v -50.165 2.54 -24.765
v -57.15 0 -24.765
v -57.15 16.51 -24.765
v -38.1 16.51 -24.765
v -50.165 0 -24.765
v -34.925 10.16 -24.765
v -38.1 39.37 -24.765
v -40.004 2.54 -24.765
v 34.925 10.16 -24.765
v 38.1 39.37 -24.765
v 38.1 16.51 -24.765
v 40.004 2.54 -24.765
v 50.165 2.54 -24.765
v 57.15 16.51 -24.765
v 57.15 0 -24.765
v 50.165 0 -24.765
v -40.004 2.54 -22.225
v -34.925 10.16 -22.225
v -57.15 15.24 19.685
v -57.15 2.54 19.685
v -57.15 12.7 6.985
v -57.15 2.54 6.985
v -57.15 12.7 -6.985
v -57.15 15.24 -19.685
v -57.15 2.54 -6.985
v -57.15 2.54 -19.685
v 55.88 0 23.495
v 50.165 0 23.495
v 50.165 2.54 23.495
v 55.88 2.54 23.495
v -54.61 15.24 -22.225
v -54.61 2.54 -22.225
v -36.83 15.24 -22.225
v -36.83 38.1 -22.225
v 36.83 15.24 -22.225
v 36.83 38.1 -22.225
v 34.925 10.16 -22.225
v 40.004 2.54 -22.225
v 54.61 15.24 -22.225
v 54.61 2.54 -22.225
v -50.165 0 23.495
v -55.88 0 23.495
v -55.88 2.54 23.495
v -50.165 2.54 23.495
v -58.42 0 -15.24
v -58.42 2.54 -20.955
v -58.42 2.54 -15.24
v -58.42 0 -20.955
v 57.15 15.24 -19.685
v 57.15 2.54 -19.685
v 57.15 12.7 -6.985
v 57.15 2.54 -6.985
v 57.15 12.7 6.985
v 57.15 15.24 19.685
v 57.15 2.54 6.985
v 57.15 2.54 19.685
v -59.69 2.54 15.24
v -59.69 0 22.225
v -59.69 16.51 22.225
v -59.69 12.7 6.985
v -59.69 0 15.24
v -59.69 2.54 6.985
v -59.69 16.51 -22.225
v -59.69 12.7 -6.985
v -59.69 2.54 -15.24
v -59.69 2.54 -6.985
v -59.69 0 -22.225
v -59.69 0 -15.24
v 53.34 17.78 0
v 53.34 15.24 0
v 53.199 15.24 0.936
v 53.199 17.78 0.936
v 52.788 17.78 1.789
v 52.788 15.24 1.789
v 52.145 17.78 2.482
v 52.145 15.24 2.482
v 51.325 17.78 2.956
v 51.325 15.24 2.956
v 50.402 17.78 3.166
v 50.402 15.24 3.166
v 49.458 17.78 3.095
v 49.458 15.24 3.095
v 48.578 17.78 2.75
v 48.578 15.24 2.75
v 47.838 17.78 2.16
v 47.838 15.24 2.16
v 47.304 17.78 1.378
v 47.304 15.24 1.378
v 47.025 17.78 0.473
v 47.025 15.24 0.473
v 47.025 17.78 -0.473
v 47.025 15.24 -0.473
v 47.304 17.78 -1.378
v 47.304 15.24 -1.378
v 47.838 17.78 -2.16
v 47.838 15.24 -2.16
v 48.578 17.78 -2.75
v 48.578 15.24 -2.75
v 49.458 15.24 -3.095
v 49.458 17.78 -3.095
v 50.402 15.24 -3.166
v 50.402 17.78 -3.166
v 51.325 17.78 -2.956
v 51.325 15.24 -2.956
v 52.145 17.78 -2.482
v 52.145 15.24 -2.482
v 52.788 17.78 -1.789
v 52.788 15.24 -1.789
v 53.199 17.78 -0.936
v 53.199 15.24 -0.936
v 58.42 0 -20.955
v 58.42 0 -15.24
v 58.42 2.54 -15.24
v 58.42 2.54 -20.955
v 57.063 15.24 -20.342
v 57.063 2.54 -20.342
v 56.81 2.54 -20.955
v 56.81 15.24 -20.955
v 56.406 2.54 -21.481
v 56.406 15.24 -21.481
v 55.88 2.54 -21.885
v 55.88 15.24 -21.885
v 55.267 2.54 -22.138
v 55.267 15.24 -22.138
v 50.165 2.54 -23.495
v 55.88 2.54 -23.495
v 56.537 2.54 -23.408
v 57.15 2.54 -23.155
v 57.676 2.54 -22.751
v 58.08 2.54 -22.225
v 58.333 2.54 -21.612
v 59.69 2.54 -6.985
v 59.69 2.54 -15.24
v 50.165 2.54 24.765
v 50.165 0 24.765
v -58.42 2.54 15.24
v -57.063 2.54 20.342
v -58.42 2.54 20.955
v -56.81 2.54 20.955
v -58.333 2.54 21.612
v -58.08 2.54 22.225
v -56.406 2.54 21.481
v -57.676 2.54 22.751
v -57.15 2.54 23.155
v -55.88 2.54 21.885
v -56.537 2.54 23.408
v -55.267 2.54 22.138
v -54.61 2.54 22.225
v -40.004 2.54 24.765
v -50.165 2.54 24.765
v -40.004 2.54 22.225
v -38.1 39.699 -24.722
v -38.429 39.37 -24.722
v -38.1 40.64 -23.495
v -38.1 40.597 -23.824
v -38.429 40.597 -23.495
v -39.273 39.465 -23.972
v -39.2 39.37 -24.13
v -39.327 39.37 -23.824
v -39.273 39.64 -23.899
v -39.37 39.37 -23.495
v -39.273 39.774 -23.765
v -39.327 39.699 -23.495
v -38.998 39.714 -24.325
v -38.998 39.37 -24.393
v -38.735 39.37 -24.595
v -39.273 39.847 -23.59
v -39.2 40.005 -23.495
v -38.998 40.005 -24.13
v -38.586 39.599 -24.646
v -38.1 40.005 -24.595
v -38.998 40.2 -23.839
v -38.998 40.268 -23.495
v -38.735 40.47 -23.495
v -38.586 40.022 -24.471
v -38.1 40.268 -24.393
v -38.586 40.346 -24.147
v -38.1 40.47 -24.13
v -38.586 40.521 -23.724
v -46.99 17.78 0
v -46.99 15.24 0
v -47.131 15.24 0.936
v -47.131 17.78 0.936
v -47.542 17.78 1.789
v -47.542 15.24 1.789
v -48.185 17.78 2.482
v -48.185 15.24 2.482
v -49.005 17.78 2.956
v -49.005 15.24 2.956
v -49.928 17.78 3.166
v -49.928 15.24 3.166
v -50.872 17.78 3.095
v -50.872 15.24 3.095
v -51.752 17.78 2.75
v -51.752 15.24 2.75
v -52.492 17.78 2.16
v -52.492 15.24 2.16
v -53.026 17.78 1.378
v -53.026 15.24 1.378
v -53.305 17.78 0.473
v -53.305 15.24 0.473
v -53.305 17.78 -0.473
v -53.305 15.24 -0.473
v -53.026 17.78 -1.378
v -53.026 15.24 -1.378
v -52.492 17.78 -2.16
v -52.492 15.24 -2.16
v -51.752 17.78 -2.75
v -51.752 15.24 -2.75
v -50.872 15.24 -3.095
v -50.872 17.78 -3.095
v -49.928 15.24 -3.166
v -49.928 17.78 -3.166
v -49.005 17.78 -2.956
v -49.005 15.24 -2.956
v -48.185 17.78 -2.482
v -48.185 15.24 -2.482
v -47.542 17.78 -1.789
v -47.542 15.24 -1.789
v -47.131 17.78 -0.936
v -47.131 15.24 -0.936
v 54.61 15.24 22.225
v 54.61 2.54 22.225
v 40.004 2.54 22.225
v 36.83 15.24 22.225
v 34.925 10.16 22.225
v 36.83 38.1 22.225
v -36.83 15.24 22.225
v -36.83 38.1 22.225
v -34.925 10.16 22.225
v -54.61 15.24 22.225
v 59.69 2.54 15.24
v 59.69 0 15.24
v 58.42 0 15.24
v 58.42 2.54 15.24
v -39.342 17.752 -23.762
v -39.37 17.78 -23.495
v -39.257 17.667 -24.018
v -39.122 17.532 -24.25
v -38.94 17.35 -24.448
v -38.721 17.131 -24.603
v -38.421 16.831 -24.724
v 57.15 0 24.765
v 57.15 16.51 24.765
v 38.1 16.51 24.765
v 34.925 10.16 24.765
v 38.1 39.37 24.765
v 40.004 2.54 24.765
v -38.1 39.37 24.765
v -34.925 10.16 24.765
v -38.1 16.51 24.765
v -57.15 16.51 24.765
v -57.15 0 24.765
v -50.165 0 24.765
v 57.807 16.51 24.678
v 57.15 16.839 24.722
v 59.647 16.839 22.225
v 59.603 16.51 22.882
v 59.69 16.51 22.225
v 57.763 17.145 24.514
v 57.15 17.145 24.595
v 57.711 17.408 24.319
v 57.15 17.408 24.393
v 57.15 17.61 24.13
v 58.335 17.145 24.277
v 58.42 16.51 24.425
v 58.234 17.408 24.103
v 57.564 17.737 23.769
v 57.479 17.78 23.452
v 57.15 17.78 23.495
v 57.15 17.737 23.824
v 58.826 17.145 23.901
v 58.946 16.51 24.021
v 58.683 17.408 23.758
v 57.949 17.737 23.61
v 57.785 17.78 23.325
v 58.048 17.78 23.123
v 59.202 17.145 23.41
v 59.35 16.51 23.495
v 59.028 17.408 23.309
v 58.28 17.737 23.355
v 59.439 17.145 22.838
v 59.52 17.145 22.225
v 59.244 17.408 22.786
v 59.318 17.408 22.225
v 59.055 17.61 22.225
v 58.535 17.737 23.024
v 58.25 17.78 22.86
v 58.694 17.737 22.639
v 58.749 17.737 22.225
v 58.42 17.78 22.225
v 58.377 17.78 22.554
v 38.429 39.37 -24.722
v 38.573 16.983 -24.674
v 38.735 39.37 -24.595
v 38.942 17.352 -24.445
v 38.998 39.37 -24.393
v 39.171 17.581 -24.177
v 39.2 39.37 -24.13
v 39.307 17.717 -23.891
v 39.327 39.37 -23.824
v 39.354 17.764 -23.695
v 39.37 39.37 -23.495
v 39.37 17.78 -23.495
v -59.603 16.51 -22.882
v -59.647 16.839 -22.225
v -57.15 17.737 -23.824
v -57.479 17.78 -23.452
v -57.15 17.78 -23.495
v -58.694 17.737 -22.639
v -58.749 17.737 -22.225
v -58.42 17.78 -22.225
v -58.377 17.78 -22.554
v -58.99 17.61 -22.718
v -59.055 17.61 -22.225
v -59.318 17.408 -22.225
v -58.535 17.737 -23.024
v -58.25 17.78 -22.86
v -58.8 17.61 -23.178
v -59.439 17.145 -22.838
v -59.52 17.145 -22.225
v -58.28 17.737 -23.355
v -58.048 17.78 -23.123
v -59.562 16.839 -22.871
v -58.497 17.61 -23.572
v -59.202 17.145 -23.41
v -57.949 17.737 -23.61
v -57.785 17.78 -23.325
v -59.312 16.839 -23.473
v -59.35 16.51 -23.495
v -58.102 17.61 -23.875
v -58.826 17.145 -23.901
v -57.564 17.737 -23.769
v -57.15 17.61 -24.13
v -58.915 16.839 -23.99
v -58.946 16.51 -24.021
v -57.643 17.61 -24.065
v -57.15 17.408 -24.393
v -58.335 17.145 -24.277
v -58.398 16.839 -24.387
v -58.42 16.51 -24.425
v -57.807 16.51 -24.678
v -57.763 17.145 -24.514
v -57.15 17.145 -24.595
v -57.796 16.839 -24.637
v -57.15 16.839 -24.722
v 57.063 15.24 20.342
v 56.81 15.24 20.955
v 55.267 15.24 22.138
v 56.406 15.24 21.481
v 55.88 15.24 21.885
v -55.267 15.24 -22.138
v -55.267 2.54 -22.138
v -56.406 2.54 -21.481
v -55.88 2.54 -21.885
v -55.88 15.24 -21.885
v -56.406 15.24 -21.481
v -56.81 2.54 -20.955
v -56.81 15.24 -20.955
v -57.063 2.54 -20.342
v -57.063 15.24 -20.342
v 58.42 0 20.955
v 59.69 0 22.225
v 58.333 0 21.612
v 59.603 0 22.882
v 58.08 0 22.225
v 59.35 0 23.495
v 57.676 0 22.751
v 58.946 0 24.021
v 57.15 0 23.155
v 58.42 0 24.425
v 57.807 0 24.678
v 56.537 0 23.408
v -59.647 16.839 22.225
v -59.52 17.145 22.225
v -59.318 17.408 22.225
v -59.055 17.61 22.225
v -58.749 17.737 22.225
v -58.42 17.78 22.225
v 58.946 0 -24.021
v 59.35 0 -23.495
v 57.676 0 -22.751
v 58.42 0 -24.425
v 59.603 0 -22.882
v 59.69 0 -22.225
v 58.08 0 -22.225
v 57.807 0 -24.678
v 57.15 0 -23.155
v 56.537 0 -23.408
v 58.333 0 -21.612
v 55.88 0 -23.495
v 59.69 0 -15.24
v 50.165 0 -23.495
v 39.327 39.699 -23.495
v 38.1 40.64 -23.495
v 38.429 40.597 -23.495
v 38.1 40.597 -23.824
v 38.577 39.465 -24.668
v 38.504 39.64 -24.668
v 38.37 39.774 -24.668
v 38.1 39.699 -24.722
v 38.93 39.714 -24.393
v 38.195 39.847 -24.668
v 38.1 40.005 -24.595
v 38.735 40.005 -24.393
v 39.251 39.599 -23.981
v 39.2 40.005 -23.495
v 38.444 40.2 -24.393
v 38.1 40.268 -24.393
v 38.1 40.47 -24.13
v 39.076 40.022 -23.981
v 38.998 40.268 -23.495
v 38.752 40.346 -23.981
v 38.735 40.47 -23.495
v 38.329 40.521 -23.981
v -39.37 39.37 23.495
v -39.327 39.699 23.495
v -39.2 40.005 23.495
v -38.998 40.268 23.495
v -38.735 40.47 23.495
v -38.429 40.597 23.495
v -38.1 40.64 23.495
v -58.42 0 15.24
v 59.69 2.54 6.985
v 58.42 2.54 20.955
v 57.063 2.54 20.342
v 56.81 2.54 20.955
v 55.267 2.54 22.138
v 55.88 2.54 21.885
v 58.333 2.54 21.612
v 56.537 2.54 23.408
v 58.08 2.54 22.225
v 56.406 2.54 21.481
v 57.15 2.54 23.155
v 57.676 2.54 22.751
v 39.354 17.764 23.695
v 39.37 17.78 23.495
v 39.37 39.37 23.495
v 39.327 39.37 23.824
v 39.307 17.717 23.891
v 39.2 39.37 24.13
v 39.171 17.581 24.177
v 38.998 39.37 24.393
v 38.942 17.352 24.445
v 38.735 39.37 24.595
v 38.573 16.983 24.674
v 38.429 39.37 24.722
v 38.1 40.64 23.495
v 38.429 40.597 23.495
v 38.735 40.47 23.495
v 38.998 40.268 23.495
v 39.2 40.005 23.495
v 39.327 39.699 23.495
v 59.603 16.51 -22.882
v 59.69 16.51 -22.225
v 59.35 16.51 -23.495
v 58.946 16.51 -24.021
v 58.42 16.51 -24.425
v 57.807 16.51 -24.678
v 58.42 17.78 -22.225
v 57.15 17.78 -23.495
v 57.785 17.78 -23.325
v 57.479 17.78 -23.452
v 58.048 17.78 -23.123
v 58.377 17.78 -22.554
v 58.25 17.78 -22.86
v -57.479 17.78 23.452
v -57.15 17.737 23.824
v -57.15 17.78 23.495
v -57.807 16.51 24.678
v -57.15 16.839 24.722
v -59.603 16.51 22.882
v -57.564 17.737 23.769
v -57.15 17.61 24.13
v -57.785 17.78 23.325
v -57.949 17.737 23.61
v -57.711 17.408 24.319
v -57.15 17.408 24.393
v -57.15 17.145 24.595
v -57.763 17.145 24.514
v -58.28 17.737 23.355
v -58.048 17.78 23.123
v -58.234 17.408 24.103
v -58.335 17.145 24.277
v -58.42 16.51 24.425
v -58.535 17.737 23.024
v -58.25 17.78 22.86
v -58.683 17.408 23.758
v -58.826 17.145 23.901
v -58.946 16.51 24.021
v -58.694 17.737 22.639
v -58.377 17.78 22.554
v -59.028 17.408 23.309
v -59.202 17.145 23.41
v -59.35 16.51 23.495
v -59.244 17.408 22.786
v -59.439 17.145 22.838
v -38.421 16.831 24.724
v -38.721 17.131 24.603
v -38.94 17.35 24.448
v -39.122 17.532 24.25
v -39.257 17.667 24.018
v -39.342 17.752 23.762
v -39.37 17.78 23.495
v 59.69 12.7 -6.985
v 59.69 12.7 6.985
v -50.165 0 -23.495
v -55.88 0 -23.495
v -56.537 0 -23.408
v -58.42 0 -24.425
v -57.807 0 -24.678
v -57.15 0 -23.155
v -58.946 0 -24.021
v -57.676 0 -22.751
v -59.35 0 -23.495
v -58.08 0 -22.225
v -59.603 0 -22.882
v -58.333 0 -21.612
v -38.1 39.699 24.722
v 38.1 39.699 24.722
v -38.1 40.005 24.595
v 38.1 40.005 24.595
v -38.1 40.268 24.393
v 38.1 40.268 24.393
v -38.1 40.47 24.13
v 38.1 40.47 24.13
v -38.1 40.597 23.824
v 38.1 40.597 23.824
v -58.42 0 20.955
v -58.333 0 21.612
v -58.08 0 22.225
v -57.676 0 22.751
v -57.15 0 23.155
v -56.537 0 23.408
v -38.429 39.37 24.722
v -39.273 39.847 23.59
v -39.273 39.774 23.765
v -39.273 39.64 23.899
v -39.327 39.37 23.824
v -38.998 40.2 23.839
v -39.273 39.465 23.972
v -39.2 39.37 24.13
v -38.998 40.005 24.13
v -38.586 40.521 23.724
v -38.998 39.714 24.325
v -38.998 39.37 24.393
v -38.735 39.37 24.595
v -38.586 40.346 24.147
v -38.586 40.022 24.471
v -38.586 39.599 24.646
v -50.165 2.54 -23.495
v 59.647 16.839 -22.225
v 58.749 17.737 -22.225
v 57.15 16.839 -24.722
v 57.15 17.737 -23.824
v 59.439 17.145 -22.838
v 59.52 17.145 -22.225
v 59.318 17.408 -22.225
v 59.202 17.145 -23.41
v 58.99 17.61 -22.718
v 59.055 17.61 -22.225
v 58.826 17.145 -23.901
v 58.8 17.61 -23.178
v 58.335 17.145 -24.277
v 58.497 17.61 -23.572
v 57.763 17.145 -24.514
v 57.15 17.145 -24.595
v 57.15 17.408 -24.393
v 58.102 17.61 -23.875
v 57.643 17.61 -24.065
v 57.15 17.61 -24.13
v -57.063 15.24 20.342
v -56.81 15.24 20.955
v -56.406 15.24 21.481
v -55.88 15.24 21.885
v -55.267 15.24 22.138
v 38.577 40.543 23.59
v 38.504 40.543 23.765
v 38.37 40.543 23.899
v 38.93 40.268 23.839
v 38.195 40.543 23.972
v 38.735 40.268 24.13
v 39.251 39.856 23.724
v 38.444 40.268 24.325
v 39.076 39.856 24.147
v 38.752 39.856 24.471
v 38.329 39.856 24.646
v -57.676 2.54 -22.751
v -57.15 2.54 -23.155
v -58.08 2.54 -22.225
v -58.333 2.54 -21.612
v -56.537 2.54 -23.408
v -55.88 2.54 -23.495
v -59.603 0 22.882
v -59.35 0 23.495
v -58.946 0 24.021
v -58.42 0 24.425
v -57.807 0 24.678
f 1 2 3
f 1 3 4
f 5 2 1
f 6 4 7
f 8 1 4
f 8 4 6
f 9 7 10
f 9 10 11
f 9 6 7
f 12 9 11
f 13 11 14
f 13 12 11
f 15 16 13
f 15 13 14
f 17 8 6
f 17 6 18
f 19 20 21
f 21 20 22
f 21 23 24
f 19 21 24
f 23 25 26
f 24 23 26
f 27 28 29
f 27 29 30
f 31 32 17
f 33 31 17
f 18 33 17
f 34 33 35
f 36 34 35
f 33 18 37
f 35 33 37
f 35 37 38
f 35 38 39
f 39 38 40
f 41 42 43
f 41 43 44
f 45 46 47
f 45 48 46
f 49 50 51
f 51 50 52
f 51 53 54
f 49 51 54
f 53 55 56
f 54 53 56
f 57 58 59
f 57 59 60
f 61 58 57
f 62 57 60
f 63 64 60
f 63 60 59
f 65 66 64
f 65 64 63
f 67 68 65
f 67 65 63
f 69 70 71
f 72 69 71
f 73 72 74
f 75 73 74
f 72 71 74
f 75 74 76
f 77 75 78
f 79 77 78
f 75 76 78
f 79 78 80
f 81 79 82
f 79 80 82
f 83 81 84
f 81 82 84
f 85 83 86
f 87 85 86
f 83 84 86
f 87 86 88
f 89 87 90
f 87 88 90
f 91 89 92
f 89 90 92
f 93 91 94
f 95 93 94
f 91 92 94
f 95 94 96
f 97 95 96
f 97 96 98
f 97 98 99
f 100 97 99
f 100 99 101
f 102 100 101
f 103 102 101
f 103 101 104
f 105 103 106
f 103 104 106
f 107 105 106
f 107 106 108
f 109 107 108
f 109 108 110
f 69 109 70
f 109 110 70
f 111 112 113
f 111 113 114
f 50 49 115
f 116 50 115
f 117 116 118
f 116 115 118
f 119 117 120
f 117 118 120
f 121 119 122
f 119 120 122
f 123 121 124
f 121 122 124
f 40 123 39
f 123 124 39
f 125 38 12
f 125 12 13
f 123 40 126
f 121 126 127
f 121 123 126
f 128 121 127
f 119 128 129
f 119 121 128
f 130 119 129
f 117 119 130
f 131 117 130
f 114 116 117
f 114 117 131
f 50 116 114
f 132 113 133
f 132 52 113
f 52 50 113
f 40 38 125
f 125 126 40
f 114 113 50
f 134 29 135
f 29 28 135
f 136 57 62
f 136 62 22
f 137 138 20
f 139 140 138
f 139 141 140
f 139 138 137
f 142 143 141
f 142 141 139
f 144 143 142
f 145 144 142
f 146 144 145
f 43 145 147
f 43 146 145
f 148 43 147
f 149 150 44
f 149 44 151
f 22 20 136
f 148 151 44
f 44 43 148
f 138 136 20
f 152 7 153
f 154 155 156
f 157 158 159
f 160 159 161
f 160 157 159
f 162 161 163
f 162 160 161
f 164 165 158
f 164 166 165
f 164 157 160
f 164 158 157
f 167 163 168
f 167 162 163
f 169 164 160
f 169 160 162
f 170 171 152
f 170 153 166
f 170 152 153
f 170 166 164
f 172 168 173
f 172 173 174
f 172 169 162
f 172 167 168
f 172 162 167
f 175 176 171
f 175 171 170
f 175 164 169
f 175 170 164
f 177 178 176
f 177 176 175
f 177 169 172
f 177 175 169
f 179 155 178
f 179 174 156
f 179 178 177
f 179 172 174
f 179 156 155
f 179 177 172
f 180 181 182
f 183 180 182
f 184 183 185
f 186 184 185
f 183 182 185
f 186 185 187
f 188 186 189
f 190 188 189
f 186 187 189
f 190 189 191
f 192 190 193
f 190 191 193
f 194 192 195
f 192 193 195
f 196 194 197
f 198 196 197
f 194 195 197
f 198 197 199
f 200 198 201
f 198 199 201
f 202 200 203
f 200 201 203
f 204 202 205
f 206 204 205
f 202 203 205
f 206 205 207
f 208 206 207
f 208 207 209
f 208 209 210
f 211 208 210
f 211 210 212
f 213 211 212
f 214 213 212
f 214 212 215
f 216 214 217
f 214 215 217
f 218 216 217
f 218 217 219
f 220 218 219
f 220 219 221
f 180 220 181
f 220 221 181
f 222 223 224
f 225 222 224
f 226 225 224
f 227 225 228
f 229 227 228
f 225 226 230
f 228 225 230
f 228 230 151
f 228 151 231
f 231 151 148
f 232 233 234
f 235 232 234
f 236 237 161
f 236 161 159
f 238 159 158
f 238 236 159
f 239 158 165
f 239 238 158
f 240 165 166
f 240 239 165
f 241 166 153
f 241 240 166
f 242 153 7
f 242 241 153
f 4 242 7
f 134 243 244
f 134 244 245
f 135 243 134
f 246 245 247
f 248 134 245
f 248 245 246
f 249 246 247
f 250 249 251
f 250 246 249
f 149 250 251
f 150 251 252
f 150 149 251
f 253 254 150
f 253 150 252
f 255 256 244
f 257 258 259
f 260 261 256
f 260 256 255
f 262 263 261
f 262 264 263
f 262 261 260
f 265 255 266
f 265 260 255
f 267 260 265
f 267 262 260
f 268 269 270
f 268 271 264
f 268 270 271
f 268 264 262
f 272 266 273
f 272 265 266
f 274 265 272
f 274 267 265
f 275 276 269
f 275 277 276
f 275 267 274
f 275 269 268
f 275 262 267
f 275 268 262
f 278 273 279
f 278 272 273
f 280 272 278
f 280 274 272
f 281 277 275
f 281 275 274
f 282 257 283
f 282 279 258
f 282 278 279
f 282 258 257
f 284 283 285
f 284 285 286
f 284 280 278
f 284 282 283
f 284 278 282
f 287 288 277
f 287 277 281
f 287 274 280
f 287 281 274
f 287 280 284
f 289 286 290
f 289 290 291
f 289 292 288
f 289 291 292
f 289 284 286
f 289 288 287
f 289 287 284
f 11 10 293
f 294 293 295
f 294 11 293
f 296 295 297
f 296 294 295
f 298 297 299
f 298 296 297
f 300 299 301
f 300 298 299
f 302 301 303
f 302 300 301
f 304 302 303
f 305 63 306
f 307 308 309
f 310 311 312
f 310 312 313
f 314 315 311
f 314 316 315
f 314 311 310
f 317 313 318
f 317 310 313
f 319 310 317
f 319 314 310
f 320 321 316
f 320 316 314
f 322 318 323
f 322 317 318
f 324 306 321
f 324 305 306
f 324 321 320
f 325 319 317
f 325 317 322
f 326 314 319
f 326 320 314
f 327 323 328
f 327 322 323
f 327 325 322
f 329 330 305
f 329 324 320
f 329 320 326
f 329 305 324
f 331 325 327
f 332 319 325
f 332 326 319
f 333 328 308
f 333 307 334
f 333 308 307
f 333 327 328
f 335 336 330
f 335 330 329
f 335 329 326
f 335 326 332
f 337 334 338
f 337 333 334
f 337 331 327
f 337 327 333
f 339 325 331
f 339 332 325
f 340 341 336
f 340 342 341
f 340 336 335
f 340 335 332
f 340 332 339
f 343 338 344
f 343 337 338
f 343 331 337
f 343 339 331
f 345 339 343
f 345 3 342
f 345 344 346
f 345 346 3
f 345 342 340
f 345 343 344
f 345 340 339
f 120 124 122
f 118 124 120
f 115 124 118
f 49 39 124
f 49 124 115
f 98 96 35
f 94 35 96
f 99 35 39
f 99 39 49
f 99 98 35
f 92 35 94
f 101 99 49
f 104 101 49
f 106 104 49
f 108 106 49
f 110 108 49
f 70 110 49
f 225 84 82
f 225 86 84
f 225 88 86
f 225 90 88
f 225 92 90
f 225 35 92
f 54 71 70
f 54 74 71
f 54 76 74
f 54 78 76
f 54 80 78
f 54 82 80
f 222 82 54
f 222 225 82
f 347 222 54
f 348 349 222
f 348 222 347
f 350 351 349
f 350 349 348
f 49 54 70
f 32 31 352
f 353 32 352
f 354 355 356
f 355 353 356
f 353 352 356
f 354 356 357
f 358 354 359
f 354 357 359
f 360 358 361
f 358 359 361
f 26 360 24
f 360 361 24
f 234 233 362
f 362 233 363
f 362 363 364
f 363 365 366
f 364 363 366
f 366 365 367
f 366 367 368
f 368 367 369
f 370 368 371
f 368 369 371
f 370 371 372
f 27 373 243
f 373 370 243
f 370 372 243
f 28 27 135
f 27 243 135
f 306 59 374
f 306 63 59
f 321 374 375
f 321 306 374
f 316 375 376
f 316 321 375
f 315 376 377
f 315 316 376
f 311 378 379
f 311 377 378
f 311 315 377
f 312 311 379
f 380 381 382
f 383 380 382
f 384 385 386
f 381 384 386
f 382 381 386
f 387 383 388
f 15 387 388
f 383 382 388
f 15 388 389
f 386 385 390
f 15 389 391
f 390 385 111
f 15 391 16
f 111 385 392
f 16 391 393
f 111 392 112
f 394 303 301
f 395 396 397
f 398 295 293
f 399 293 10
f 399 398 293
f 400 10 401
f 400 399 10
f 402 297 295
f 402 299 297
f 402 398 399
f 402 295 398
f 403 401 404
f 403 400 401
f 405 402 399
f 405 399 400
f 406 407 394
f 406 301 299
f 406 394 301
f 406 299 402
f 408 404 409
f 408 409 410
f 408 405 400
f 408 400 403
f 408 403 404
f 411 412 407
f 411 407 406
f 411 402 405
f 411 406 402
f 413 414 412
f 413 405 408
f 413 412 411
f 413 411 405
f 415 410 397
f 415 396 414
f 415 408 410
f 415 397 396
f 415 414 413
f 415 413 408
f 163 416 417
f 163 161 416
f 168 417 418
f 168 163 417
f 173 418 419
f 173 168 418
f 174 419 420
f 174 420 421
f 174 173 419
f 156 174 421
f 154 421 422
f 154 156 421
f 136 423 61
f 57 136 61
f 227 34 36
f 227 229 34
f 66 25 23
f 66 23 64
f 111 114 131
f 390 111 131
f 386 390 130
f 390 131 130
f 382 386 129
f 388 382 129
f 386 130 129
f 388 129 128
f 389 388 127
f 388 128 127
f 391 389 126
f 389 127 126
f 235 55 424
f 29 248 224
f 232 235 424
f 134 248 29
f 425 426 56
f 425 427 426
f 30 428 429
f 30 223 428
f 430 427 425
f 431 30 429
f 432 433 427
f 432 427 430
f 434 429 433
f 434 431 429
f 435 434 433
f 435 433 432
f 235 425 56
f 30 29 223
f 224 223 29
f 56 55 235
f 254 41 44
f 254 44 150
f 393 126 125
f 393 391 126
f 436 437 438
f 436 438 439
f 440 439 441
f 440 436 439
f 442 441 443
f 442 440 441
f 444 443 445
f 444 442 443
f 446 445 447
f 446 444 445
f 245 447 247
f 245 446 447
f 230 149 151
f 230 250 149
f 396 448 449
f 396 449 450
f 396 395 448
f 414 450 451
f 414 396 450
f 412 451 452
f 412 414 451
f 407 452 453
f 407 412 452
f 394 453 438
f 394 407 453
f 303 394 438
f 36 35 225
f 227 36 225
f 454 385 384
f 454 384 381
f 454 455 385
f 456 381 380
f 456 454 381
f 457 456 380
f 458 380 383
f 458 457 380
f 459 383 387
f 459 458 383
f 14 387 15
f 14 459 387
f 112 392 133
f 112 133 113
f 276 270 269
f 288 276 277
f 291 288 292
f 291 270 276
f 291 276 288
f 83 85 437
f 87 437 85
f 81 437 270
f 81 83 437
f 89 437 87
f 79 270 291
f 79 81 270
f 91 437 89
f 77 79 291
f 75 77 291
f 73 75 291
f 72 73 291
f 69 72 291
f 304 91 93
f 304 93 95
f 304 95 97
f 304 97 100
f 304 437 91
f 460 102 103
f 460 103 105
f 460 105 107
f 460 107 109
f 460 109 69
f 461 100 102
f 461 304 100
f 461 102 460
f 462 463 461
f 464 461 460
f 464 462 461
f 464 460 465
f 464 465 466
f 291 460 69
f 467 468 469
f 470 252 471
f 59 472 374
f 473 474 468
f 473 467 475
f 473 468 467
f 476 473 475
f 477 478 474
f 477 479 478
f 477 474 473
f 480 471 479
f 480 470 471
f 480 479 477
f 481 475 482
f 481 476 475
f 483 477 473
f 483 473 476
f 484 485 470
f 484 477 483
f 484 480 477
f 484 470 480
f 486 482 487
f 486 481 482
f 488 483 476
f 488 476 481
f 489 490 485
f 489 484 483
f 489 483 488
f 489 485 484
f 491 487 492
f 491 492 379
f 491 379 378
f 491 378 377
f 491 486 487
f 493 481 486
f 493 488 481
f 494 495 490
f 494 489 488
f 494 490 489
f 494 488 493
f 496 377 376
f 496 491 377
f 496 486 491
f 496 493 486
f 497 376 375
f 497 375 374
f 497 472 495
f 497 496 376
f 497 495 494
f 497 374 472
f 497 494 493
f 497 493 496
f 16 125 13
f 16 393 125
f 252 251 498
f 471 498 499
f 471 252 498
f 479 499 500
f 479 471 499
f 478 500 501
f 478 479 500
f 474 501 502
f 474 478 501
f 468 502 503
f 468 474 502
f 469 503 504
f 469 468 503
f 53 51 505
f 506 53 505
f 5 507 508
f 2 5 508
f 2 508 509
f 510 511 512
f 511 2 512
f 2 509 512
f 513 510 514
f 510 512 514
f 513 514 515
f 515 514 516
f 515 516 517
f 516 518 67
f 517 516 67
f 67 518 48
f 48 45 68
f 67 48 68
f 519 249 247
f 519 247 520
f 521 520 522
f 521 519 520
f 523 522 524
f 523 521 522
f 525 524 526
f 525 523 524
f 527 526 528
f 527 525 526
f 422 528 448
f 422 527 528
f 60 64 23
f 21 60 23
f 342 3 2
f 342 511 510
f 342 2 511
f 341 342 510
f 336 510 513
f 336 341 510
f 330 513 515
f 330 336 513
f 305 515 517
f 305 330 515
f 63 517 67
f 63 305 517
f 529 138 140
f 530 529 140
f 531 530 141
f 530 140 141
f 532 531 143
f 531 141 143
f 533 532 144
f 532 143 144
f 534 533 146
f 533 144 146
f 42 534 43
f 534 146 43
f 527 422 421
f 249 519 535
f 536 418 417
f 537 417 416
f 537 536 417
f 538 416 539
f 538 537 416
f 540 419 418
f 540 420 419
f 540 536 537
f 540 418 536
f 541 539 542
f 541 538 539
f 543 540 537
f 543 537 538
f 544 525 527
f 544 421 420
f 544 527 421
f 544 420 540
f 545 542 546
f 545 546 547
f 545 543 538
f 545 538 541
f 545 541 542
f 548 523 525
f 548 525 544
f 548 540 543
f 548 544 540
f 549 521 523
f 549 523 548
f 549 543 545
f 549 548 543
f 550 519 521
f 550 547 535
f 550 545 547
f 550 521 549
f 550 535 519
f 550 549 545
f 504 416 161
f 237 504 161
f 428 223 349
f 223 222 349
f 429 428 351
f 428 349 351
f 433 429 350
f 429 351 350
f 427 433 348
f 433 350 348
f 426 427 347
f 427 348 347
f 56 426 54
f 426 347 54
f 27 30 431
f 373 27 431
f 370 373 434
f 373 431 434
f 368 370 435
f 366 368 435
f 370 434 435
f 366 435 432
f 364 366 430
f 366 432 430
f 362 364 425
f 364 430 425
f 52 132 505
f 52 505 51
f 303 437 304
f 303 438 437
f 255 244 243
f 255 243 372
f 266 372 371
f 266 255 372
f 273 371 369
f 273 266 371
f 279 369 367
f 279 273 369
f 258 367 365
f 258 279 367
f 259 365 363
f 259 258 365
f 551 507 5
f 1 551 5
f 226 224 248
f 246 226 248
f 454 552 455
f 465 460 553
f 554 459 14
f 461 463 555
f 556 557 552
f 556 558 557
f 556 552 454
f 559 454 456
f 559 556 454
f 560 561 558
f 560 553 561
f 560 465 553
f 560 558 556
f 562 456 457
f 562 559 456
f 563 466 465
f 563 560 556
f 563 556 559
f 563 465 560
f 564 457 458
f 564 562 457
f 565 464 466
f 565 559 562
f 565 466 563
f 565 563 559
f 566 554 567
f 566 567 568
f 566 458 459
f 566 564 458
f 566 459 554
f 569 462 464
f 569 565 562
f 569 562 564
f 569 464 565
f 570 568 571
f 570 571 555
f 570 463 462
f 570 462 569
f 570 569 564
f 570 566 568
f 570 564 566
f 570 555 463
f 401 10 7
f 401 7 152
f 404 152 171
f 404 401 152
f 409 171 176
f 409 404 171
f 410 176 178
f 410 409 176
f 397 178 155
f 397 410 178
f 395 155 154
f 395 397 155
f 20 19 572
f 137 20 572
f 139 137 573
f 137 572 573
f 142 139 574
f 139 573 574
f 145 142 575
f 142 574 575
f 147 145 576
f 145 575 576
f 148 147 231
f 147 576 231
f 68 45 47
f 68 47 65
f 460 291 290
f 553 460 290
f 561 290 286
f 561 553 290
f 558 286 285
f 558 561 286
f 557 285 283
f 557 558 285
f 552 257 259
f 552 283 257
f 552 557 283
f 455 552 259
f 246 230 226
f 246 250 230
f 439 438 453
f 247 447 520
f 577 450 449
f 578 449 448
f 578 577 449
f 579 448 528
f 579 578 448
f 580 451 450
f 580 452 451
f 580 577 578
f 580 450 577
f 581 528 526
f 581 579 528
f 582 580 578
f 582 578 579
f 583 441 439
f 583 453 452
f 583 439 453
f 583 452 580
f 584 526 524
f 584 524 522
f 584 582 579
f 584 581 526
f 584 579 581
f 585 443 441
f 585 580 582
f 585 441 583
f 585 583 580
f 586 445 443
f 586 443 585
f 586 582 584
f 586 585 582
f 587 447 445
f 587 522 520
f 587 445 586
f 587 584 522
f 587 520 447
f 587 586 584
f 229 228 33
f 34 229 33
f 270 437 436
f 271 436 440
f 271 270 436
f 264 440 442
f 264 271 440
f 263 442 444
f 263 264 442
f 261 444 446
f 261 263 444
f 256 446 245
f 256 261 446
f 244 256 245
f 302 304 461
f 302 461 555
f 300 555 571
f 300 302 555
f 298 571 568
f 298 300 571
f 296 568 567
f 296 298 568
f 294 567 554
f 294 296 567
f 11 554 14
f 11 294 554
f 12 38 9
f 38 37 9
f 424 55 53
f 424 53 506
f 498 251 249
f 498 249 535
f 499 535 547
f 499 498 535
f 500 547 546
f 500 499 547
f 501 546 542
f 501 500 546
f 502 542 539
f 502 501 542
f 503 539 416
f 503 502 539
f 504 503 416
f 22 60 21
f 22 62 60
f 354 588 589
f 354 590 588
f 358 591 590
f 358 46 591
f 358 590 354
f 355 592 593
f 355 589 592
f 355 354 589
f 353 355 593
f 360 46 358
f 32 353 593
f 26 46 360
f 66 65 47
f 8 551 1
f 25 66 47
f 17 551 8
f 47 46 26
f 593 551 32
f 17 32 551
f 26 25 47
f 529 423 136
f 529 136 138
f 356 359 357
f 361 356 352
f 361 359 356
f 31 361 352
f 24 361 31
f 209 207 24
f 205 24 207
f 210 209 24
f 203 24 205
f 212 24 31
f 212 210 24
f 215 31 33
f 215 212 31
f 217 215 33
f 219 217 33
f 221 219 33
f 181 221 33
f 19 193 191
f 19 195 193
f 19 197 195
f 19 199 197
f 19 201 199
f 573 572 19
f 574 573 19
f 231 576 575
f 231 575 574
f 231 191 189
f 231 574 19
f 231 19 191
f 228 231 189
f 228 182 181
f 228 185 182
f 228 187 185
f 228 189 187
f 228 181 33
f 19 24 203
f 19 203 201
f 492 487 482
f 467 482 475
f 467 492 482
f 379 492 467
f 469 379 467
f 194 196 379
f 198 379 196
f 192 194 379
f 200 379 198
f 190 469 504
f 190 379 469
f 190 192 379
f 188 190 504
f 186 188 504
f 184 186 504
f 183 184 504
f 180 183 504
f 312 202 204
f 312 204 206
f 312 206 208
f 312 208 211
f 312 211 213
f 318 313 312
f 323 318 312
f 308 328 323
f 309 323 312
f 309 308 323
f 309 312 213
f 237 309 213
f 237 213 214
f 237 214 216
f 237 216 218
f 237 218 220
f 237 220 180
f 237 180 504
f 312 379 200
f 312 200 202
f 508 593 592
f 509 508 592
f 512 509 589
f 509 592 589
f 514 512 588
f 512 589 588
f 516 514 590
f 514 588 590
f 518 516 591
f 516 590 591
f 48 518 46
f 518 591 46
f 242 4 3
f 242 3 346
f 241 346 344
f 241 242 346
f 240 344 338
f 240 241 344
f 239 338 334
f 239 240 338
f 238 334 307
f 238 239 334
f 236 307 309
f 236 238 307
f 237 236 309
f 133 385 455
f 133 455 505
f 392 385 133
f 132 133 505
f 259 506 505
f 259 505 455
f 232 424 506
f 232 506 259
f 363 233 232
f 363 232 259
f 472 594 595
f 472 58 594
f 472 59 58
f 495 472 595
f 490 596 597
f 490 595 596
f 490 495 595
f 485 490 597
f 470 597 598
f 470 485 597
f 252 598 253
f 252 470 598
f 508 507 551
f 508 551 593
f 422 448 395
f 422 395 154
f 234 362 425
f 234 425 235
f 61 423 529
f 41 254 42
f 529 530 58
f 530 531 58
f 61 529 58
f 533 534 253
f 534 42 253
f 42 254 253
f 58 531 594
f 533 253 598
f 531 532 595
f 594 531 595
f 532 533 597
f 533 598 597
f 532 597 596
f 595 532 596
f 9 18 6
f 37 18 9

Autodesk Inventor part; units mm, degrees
ref_plane "YZ Plane" through (0, 0, 0) normal (1, 0, 0) x (0, 1, 0)
ref_plane "XZ Plane" through (0, 0, 0) normal (0, 1, 0) x (-1, 0, 0)
ref_plane "XY Plane" through (0, 0, 0) normal (0, 0, 1) x (1, 0, 0)
sketch "Sketch1" plane through (0, 0, 0) normal (0, 1, 0) x (-1, 0, 0)
  line L0 (-59.69, 24.765) -> (59.69, 24.765)
  line L1 (59.69, 24.765) -> (59.69, -24.765)
  line L2 (59.69, -24.765) -> (-59.69, -24.765)
  line L3 (-59.69, -24.765) -> (-59.69, 24.765)
  point P0 (0, 0)
  dimension "d0" = 119.38
  dimension "d1" = 49.53
  dimension "d2" = 24.765
  dimension "d22" = 59.69
extrude "Extrusion1" add sketch "Sketch1" along normal blind 40.64
sketch "Sketch2" plane through (0, 40.64, 0) normal (0, 1, 0) x (1, 0, 0)
  line L0 (-59.69, -24.765) -> (-39.37, -24.765)
  line L1 (-39.37, -24.765) -> (-39.37, 24.765)
  line L2 (-39.37, 24.765) -> (-59.69, 24.765)
  line L3 (-59.69, 24.765) -> (-59.69, -24.765)
  line L4 (59.69, -24.765) -> (59.69, 24.765) projected
  line L5 (59.69, -24.765) -> (39.37, -24.765)
  line L6 (39.37, -24.765) -> (39.37, 24.765)
  line L7 (39.37, 24.765) -> (59.69, 24.765)
  line L8 (59.69, 24.765) -> (59.69, -24.765)
  point P0 (0, 0)
  point P1 (59.69, 24.765)
  dimension "d6" = 20.32
  dimension "d7" = 20.32
  dimension "d8" = 49.53
  dimension "d9" = 49.53
  dimension "d10" = 78.74
extrude "Extrusion2" cut sketch "Sketch2" against normal blind 22.86
sketch "Sketch3" plane through (0, 0, 0) normal (0, -1, 0) x (1, 0, 0)
  circle A0 centre (50.165, 0) radius 3.175
  circle A1 centre (-50.165, 0) radius 3.175
  line L0 (-59.69, -24.765) -> (-59.69, 24.765) projected
  line L1 (59.69, 24.765) -> (59.69, -24.765) projected
  point P0 (0, 0)
  dimension "d13" = 6.35
  dimension "d14" = 6.35
  dimension "d15" = 6.35
extrude "Extrusion3" cut sketch "Sketch3" against normal blind 22.86
sketch "Sketch4" plane through (0, 0, 0) normal (0, -1, 0) x (1, 0, 0)
  line L0 (-57.15, -22.225) -> (57.15, -22.225)
  line L1 (57.15, -22.225) -> (57.15, 22.225)
  line L2 (57.15, 22.225) -> (-57.15, 22.225)
  line L3 (-57.15, 22.225) -> (-57.15, -22.225)
  line L4 (-59.69, -24.765) -> (-59.69, 24.765) projected
  line L5 (59.69, 24.765) -> (59.69, -24.765) projected
  line L6 (-59.69, 24.765) -> (59.69, 24.765) projected
  line L7 (59.69, -24.765) -> (-59.69, -24.765) projected
  point P0 (0, 0)
  dimension "d18" = 2.54
  dimension "d19" = 2.54
  dimension "d20" = 2.54
  dimension "d21" = 2.54
extrude "Extrusion4" cut sketch "Sketch4" against normal blind 15.24 contours L3 L2 L1 L0
sketch "Sketch5" plane through (0, 15.24, 0) normal (0, -1, 0) x (1, 0, 0)
  line L0 (-57.15, 22.225) -> (57.15, 22.225) projected
  line L1 (-36.83, -22.225) -> (36.83, -22.225)
  line L2 (36.83, -22.225) -> (36.83, 22.225)
  line L3 (36.83, 22.225) -> (-36.83, 22.225)
  line L4 (-36.83, 22.225) -> (-36.83, -22.225)
  line L5 (-36.83, -22.225) -> (36.83, 22.225) construction
  line L6 (36.83, -22.225) -> (-36.83, 22.225) construction
  point P0 (0, 0)
  dimension "d25" = 73.66
extrude "Extrusion5" cut sketch "Sketch5" against normal blind 22.86
sketch "Sketch6" plane through (0, 0, 0) normal (0, -1, 0) x (1, 0, 0)
  line L0 (58.42, -23.495) -> (-58.42, 23.495) construction
  line L1 (-58.42, -23.495) -> (58.42, 23.495) construction
  line L2 (-59.69, -24.765) -> (-59.69, 24.765) projected
  line L3 (-59.69, 24.765) -> (59.69, 24.765) projected
  line L4 (50.165, 23.495) -> (50.165, 24.765)
  line L5 (-50.165, 23.495) -> (-50.165, 24.765)
  line L6 (-58.42, 15.24) -> (-59.69, 15.24)
  line L7 (-58.42, -15.24) -> (-59.69, -15.24)
  line L8 (-50.165, -23.495) -> (-50.165, -24.765)
  line L9 (50.165, -23.495) -> (50.165, -24.765)
  line L10 (59.69, -24.765) -> (-59.69, -24.765) projected
  line L11 (59.69, 24.765) -> (59.69, -24.765) projected
  line L12 (59.69, -15.24) -> (58.42, -15.24)
  line L13 (59.69, 15.24) -> (58.42, 15.24)
  line L14 (-50.165, 24.765) -> (50.165, 24.765)
  line L15 (59.69, -15.24) -> (59.69, 15.24)
  line L16 (50.165, -24.765) -> (-50.165, -24.765)
  line L17 (-59.69, -15.24) -> (-59.69, 15.24)
  line L18 (-57.15, -22.225) -> (-57.15, 22.225) projected
  line L19 (57.15, 22.225) -> (-57.15, 22.225)
  line L20 (-57.15, 22.225) -> (-57.15, -22.225)
  line L21 (-57.15, -22.225) -> (57.15, -22.225)
  line L22 (57.15, -22.225) -> (57.15, 22.225)
  line L23 (57.15, 22.225) -> (-57.15, -22.225) construction
  line L24 (-57.15, 22.225) -> (57.15, -22.225) construction
  line L25 (-58.42, -23.495) -> (-58.42, -15.24)
  line L26 (-58.42, 15.24) -> (-58.42, 23.495)
  line L27 (-58.42, 23.495) -> (-50.165, 23.495)
  line L28 (50.165, 23.495) -> (58.42, 23.495)
  line L29 (58.42, 23.495) -> (58.42, 15.24)
  line L30 (58.42, -15.24) -> (58.42, -23.495)
  line L31 (58.42, -23.495) -> (50.165, -23.495)
  line L32 (-50.165, -23.495) -> (-58.42, -23.495)
  point P0 (0, 0)
  point P1 (-59.055, 15.24)
  point P2 (-59.055, -15.24)
  dimension "d30" = 100.33
  dimension "d31" = 50.165
  dimension "d32" = 30.48
  dimension "d33" = 15.24
  dimension "d34" = 30.48
  dimension "d35" = 15.24
  dimension "d40" = 100.33
  dimension "d41" = 50.165
extrude "Extrusion6" cut sketch "Sketch6" against normal blind 2.54 contours L2 L6 L26 L27 L5 L3 L4 L28 L29 L13 L11 L12 L30 L31 L9 L10 L8 L32 L25 L7 | L18 L19 L22 L21
sketch "Sketch7" plane through (0, 2.54, 0) normal (0, -1, 0) x (1, 0, 0)
  line L0 (-36.83, 22.225) -> (36.83, 22.225) projected
  line L1 (-39.37, 24.765) -> (39.37, 24.765) projected
  line L2 (34.925, 22.225) -> (-34.925, 22.225)
  line L3 (-34.925, 22.225) -> (-34.925, 24.765)
  line L4 (-34.925, 24.765) -> (34.925, 24.765)
  line L5 (34.925, 24.765) -> (34.925, 22.225)
  line L6 (50.165, -24.765) -> (-50.165, -24.765) projected
  line L7 (-57.15, -22.225) -> (57.15, -22.225) projected
  line L8 (-34.925, -24.765) -> (34.925, -24.765)
  line L9 (34.925, -24.765) -> (34.925, -22.225)
  line L10 (34.925, -22.225) -> (-34.925, -22.225)
  line L11 (-34.925, -22.225) -> (-34.925, -24.765)
  point P0 (0, 0)
  dimension "d42" = 69.85
  dimension "d43" = 34.925
  dimension "d44" = 69.85
  dimension "d45" = 34.925
extrude "Extrusion7" cut sketch "Sketch7" against normal blind 7.62
sketch "Sketch8" plane through (0, 2.54, 0) normal (0, -1, 0) x (1, 0, 0)
  line L0 (-57.15, 22.225) -> (-57.15, -22.225) projected
  line L1 (-59.69, -15.24) -> (-59.69, 15.24) projected
  line L2 (-57.15, -6.985) -> (-59.69, -6.985)
  line L3 (-59.69, -6.985) -> (-59.69, 6.985)
  line L4 (-59.69, 6.985) -> (-57.15, 6.985)
  line L5 (-57.15, 6.985) -> (-57.15, -6.985)
  point P0 (0, 0)
  dimension "d48" = 13.97
  dimension "d49" = 6.985
extrude "Extrusion8" cut sketch "Sketch8" against normal blind 10.16
mirror "Mirror1" about plane through (0, 0, 0) normal (1, 0, 0) of "Extrusion8"
fillet "Fillet1" radius 2.54 12 edges at (57.15, 8.89, 22.225) (58.42, 1.27, 23.495) (-58.42, 1.27, 23.495) (-57.15, 8.89, 22.225) (-58.42, 1.27, -23.495) (-57.15, 8.89, -22.225) (57.15, 8.89, -22.225) (58.42, 1.27, -23.495) (-59.69, 8.89, 24.765) (59.69, 8.89, 24.765) (-59.69, 8.89, -24.765) (59.69, 8.89, -24.765)
fillet "Fillet2" radius 1.27 18 edges at (-58.9461, 17.78, 24.0211) (-59.69, 17.78, 0) (-58.9461, 17.78, -24.0211) (-48.26, 17.78, -24.765) (-48.26, 17.78, 24.765) (58.9461, 17.78, 24.0211) (59.69, 17.78, 0) (58.9461, 17.78, -24.0211) (48.26, 17.78, -24.765) (48.26, 17.78, 24.765) (39.37, 29.21, 24.765) (0, 40.64, 24.765) (39.37, 40.64, 0) (39.37, 29.21, -24.765) (0, 40.64, -24.765) (-39.37, 40.64, 0) (-39.37, 29.21, 24.765) (-39.37, 29.21, -24.765)
chamfer "Chamfer1" distance 5.08 distance2 7.62 1 edges at (-34.925, 2.54, 23.495) measured on face at (-40.005, 2.54, 23.495)
chamfer "Chamfer2" distance 5.08 distance2 7.62 1 edges at (34.925, 2.54, 23.495) measured on face at (40.005, 2.54, 23.495)
chamfer "Chamfer3" distance 5.08 distance2 7.62 1 edges at (34.925, 2.54, -23.495) measured on face at (40.005, 2.54, -23.495)
chamfer "Chamfer4" distance 5.08 distance2 7.62 1 edges at (-34.925, 2.54, -23.495) measured on face at (-40.005, 2.54, -23.495)
properties part number "CO-1-01-12VoltFuseBox"
